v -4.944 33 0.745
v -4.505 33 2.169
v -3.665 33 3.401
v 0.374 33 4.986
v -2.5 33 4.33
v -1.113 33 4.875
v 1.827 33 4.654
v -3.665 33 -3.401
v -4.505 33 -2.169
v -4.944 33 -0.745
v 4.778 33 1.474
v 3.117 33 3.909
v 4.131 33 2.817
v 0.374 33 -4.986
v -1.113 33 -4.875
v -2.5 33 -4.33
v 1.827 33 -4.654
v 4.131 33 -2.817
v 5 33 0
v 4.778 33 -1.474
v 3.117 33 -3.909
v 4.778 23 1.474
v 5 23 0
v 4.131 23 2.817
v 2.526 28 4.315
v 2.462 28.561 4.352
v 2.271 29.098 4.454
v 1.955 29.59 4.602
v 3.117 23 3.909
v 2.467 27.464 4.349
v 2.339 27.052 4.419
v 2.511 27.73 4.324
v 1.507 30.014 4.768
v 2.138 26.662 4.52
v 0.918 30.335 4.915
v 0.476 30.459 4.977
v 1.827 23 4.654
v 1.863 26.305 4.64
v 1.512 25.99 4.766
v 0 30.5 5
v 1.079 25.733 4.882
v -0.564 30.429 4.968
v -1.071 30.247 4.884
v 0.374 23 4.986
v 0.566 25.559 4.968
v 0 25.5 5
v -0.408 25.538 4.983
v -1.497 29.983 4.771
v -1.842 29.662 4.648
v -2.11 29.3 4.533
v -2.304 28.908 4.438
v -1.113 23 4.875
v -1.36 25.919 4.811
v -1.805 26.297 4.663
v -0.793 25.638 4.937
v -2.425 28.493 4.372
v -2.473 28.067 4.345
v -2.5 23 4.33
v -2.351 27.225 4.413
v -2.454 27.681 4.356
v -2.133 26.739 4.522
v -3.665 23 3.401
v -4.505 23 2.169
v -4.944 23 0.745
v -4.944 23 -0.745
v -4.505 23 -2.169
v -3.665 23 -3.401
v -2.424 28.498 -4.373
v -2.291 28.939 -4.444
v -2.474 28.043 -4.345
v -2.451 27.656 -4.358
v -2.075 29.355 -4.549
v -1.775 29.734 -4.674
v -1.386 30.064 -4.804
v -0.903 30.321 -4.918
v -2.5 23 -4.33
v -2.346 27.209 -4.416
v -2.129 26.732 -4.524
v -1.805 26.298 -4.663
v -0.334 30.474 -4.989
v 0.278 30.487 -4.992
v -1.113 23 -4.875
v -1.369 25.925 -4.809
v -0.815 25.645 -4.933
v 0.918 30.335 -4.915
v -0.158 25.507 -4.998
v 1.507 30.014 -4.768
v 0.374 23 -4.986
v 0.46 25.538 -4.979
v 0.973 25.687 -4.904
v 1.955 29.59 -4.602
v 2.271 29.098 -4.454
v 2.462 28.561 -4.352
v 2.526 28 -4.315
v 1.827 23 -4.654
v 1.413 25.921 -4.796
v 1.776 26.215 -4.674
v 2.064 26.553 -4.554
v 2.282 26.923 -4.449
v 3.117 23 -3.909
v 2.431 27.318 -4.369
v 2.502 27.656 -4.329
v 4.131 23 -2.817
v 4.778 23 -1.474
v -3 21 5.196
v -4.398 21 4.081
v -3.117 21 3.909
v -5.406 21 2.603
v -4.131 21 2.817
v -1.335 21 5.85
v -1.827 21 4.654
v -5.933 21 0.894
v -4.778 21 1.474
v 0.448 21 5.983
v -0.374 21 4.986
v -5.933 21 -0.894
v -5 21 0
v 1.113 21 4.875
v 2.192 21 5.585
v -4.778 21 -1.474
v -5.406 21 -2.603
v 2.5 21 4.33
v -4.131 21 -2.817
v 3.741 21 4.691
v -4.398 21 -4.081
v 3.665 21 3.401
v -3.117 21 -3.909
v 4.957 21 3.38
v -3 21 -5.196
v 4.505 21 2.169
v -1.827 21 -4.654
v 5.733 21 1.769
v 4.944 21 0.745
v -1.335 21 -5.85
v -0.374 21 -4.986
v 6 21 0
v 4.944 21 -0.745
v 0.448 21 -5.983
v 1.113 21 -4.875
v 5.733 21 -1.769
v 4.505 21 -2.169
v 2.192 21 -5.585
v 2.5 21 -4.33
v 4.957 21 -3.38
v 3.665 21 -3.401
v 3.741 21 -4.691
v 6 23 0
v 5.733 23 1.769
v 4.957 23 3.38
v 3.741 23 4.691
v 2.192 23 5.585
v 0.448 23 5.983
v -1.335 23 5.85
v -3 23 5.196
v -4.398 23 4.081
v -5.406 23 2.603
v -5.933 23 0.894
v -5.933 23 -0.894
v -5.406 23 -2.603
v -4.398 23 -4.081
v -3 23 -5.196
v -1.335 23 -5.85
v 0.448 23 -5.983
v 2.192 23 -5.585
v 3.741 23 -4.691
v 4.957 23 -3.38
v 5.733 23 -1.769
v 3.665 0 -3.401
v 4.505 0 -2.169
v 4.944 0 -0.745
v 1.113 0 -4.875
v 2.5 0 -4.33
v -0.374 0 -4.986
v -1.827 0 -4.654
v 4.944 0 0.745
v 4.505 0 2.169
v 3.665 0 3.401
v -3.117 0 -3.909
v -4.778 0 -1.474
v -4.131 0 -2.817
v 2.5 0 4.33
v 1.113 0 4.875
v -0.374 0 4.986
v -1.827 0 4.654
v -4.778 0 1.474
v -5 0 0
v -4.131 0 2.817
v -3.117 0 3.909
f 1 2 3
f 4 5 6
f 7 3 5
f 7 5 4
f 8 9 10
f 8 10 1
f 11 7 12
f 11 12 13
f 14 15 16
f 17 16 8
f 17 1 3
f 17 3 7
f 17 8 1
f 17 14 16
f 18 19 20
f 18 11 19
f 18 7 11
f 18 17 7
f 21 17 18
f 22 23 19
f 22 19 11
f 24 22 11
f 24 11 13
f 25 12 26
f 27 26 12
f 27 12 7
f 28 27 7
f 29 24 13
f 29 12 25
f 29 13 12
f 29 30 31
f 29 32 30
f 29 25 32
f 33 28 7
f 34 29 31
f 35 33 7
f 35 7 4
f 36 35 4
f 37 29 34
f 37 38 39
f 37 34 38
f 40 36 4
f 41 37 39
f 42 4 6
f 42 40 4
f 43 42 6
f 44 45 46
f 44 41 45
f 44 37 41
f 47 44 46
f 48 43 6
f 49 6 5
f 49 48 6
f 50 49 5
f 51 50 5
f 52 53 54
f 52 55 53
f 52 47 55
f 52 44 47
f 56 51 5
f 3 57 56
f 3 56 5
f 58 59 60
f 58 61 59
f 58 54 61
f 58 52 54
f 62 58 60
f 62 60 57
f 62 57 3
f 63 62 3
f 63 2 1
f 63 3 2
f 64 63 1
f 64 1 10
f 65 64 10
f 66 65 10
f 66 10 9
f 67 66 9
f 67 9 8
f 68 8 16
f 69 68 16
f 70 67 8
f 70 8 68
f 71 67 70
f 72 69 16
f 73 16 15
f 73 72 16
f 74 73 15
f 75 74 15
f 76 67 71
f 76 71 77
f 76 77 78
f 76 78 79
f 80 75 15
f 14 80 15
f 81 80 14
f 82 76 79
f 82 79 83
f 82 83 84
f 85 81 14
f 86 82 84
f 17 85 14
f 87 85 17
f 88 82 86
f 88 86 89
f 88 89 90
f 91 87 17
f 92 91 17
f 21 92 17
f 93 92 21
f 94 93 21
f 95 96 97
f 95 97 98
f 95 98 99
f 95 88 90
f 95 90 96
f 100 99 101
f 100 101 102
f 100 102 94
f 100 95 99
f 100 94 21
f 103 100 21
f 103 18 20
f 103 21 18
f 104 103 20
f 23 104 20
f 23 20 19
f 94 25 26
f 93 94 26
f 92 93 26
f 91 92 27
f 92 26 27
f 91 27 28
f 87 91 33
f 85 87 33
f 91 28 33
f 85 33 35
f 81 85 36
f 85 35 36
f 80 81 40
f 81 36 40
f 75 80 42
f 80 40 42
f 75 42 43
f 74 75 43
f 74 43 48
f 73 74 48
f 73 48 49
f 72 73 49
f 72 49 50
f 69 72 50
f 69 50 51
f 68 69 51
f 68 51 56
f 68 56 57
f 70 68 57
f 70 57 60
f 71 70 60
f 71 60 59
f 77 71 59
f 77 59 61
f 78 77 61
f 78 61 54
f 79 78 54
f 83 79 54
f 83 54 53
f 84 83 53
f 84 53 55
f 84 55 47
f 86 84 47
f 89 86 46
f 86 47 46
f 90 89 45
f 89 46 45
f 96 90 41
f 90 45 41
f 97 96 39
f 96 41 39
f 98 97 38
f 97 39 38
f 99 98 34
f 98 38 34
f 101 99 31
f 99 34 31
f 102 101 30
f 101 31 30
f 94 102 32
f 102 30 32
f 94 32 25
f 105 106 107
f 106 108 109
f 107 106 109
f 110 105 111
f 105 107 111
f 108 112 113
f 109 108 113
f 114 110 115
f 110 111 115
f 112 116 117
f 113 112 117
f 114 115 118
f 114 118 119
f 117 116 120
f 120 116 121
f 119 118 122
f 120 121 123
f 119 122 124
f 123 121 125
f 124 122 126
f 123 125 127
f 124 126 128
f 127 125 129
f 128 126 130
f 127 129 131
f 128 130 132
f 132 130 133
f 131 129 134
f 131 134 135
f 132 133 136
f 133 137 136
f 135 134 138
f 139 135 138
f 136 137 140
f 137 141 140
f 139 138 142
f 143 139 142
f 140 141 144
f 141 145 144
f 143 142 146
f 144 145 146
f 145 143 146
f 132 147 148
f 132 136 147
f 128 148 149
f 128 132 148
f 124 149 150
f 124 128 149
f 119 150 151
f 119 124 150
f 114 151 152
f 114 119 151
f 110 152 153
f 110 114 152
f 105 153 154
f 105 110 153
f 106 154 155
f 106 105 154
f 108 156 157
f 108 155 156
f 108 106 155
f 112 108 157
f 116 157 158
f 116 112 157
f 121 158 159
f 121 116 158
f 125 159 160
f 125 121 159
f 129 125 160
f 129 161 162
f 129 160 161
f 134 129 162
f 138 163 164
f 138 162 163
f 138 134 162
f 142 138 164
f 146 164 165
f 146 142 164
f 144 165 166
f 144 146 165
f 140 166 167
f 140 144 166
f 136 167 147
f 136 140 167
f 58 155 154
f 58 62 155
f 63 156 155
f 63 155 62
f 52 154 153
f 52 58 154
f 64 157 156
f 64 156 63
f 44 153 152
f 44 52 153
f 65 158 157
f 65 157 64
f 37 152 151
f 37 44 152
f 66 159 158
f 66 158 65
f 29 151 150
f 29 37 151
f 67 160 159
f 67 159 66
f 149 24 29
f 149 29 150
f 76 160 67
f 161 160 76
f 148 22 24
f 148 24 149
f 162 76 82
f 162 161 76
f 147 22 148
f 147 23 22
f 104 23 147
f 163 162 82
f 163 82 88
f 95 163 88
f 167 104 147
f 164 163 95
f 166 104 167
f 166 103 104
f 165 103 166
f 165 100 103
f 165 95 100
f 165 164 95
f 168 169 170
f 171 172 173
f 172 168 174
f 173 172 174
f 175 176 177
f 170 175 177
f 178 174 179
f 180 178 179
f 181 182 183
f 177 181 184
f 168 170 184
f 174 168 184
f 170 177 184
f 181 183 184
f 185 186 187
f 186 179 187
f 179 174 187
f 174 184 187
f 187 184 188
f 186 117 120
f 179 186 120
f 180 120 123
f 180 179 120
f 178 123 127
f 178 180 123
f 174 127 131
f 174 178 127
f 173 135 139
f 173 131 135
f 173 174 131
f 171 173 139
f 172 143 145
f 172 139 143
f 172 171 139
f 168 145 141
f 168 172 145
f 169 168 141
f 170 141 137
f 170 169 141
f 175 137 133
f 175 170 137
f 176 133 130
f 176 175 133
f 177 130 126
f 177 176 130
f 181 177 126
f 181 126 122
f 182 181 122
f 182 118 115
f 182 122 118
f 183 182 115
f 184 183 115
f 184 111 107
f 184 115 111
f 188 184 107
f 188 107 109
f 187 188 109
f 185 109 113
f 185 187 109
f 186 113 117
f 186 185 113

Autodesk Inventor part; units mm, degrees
ref_plane "YZ Plane" through (0, 0, 0) normal (1, 0, 0) x (0, 1, 0)
ref_plane "XZ Plane" through (0, 0, 0) normal (0, 1, 0) x (-1, 0, 0)
sketch "Boceto1" plane through (0, 0, 0) normal (0, 1, 0) x (-1, 0, 0)
  circle A0 centre (0, 0) radius 5
  dimension "d0" = 10
extrude "Extrusión1" add sketch "Boceto1" along normal blind 21
thread "Rosca1" size "M9x1.25" class "6g" standard "ANSI Metric M Profile" length 13
sketch "Boceto2" plane through (0, 21, 0) normal (0, 1, 0) x (1, 0, 0)
  circle A0 centre (0, 0) radius 6
  dimension "d5" = 12
extrude "Extrusión2" add sketch "Boceto2" along normal blind 2
sketch "Boceto3" plane through (0, 23, 0) normal (0, 1, 0) x (1, 0, 0)
  circle A0 centre (0, 0) radius 5
  dimension "d8" = 10
extrude "Extrusión3" add sketch "Boceto3" along normal blind 10
ref_plane "Plano de trabajo1" through (0, 23, 5) normal (0, 0, 1) x (1, 0, 0)
sketch "Boceto4" plane through (0, 23, 5) normal (0, 0, 1) x (1, 0, 0)
  line L0 (5, 10) -> (-5, 10) projected
  line L1 (-5, 10) -> (5.0514, 0) construction
  line L2 (6, 0) -> (-6, 0) projected
  line L3 (5, 0) -> (5, 10) projected
  line L4 (5, 10) -> (-4.9489, 0) construction
  circle A0 centre (0.0256, 5) radius 2.5
  point P0 (0, -23)
  dimension "d11" = 5
extrude "Extrusión4" cut sketch "Boceto4" against normal through all
